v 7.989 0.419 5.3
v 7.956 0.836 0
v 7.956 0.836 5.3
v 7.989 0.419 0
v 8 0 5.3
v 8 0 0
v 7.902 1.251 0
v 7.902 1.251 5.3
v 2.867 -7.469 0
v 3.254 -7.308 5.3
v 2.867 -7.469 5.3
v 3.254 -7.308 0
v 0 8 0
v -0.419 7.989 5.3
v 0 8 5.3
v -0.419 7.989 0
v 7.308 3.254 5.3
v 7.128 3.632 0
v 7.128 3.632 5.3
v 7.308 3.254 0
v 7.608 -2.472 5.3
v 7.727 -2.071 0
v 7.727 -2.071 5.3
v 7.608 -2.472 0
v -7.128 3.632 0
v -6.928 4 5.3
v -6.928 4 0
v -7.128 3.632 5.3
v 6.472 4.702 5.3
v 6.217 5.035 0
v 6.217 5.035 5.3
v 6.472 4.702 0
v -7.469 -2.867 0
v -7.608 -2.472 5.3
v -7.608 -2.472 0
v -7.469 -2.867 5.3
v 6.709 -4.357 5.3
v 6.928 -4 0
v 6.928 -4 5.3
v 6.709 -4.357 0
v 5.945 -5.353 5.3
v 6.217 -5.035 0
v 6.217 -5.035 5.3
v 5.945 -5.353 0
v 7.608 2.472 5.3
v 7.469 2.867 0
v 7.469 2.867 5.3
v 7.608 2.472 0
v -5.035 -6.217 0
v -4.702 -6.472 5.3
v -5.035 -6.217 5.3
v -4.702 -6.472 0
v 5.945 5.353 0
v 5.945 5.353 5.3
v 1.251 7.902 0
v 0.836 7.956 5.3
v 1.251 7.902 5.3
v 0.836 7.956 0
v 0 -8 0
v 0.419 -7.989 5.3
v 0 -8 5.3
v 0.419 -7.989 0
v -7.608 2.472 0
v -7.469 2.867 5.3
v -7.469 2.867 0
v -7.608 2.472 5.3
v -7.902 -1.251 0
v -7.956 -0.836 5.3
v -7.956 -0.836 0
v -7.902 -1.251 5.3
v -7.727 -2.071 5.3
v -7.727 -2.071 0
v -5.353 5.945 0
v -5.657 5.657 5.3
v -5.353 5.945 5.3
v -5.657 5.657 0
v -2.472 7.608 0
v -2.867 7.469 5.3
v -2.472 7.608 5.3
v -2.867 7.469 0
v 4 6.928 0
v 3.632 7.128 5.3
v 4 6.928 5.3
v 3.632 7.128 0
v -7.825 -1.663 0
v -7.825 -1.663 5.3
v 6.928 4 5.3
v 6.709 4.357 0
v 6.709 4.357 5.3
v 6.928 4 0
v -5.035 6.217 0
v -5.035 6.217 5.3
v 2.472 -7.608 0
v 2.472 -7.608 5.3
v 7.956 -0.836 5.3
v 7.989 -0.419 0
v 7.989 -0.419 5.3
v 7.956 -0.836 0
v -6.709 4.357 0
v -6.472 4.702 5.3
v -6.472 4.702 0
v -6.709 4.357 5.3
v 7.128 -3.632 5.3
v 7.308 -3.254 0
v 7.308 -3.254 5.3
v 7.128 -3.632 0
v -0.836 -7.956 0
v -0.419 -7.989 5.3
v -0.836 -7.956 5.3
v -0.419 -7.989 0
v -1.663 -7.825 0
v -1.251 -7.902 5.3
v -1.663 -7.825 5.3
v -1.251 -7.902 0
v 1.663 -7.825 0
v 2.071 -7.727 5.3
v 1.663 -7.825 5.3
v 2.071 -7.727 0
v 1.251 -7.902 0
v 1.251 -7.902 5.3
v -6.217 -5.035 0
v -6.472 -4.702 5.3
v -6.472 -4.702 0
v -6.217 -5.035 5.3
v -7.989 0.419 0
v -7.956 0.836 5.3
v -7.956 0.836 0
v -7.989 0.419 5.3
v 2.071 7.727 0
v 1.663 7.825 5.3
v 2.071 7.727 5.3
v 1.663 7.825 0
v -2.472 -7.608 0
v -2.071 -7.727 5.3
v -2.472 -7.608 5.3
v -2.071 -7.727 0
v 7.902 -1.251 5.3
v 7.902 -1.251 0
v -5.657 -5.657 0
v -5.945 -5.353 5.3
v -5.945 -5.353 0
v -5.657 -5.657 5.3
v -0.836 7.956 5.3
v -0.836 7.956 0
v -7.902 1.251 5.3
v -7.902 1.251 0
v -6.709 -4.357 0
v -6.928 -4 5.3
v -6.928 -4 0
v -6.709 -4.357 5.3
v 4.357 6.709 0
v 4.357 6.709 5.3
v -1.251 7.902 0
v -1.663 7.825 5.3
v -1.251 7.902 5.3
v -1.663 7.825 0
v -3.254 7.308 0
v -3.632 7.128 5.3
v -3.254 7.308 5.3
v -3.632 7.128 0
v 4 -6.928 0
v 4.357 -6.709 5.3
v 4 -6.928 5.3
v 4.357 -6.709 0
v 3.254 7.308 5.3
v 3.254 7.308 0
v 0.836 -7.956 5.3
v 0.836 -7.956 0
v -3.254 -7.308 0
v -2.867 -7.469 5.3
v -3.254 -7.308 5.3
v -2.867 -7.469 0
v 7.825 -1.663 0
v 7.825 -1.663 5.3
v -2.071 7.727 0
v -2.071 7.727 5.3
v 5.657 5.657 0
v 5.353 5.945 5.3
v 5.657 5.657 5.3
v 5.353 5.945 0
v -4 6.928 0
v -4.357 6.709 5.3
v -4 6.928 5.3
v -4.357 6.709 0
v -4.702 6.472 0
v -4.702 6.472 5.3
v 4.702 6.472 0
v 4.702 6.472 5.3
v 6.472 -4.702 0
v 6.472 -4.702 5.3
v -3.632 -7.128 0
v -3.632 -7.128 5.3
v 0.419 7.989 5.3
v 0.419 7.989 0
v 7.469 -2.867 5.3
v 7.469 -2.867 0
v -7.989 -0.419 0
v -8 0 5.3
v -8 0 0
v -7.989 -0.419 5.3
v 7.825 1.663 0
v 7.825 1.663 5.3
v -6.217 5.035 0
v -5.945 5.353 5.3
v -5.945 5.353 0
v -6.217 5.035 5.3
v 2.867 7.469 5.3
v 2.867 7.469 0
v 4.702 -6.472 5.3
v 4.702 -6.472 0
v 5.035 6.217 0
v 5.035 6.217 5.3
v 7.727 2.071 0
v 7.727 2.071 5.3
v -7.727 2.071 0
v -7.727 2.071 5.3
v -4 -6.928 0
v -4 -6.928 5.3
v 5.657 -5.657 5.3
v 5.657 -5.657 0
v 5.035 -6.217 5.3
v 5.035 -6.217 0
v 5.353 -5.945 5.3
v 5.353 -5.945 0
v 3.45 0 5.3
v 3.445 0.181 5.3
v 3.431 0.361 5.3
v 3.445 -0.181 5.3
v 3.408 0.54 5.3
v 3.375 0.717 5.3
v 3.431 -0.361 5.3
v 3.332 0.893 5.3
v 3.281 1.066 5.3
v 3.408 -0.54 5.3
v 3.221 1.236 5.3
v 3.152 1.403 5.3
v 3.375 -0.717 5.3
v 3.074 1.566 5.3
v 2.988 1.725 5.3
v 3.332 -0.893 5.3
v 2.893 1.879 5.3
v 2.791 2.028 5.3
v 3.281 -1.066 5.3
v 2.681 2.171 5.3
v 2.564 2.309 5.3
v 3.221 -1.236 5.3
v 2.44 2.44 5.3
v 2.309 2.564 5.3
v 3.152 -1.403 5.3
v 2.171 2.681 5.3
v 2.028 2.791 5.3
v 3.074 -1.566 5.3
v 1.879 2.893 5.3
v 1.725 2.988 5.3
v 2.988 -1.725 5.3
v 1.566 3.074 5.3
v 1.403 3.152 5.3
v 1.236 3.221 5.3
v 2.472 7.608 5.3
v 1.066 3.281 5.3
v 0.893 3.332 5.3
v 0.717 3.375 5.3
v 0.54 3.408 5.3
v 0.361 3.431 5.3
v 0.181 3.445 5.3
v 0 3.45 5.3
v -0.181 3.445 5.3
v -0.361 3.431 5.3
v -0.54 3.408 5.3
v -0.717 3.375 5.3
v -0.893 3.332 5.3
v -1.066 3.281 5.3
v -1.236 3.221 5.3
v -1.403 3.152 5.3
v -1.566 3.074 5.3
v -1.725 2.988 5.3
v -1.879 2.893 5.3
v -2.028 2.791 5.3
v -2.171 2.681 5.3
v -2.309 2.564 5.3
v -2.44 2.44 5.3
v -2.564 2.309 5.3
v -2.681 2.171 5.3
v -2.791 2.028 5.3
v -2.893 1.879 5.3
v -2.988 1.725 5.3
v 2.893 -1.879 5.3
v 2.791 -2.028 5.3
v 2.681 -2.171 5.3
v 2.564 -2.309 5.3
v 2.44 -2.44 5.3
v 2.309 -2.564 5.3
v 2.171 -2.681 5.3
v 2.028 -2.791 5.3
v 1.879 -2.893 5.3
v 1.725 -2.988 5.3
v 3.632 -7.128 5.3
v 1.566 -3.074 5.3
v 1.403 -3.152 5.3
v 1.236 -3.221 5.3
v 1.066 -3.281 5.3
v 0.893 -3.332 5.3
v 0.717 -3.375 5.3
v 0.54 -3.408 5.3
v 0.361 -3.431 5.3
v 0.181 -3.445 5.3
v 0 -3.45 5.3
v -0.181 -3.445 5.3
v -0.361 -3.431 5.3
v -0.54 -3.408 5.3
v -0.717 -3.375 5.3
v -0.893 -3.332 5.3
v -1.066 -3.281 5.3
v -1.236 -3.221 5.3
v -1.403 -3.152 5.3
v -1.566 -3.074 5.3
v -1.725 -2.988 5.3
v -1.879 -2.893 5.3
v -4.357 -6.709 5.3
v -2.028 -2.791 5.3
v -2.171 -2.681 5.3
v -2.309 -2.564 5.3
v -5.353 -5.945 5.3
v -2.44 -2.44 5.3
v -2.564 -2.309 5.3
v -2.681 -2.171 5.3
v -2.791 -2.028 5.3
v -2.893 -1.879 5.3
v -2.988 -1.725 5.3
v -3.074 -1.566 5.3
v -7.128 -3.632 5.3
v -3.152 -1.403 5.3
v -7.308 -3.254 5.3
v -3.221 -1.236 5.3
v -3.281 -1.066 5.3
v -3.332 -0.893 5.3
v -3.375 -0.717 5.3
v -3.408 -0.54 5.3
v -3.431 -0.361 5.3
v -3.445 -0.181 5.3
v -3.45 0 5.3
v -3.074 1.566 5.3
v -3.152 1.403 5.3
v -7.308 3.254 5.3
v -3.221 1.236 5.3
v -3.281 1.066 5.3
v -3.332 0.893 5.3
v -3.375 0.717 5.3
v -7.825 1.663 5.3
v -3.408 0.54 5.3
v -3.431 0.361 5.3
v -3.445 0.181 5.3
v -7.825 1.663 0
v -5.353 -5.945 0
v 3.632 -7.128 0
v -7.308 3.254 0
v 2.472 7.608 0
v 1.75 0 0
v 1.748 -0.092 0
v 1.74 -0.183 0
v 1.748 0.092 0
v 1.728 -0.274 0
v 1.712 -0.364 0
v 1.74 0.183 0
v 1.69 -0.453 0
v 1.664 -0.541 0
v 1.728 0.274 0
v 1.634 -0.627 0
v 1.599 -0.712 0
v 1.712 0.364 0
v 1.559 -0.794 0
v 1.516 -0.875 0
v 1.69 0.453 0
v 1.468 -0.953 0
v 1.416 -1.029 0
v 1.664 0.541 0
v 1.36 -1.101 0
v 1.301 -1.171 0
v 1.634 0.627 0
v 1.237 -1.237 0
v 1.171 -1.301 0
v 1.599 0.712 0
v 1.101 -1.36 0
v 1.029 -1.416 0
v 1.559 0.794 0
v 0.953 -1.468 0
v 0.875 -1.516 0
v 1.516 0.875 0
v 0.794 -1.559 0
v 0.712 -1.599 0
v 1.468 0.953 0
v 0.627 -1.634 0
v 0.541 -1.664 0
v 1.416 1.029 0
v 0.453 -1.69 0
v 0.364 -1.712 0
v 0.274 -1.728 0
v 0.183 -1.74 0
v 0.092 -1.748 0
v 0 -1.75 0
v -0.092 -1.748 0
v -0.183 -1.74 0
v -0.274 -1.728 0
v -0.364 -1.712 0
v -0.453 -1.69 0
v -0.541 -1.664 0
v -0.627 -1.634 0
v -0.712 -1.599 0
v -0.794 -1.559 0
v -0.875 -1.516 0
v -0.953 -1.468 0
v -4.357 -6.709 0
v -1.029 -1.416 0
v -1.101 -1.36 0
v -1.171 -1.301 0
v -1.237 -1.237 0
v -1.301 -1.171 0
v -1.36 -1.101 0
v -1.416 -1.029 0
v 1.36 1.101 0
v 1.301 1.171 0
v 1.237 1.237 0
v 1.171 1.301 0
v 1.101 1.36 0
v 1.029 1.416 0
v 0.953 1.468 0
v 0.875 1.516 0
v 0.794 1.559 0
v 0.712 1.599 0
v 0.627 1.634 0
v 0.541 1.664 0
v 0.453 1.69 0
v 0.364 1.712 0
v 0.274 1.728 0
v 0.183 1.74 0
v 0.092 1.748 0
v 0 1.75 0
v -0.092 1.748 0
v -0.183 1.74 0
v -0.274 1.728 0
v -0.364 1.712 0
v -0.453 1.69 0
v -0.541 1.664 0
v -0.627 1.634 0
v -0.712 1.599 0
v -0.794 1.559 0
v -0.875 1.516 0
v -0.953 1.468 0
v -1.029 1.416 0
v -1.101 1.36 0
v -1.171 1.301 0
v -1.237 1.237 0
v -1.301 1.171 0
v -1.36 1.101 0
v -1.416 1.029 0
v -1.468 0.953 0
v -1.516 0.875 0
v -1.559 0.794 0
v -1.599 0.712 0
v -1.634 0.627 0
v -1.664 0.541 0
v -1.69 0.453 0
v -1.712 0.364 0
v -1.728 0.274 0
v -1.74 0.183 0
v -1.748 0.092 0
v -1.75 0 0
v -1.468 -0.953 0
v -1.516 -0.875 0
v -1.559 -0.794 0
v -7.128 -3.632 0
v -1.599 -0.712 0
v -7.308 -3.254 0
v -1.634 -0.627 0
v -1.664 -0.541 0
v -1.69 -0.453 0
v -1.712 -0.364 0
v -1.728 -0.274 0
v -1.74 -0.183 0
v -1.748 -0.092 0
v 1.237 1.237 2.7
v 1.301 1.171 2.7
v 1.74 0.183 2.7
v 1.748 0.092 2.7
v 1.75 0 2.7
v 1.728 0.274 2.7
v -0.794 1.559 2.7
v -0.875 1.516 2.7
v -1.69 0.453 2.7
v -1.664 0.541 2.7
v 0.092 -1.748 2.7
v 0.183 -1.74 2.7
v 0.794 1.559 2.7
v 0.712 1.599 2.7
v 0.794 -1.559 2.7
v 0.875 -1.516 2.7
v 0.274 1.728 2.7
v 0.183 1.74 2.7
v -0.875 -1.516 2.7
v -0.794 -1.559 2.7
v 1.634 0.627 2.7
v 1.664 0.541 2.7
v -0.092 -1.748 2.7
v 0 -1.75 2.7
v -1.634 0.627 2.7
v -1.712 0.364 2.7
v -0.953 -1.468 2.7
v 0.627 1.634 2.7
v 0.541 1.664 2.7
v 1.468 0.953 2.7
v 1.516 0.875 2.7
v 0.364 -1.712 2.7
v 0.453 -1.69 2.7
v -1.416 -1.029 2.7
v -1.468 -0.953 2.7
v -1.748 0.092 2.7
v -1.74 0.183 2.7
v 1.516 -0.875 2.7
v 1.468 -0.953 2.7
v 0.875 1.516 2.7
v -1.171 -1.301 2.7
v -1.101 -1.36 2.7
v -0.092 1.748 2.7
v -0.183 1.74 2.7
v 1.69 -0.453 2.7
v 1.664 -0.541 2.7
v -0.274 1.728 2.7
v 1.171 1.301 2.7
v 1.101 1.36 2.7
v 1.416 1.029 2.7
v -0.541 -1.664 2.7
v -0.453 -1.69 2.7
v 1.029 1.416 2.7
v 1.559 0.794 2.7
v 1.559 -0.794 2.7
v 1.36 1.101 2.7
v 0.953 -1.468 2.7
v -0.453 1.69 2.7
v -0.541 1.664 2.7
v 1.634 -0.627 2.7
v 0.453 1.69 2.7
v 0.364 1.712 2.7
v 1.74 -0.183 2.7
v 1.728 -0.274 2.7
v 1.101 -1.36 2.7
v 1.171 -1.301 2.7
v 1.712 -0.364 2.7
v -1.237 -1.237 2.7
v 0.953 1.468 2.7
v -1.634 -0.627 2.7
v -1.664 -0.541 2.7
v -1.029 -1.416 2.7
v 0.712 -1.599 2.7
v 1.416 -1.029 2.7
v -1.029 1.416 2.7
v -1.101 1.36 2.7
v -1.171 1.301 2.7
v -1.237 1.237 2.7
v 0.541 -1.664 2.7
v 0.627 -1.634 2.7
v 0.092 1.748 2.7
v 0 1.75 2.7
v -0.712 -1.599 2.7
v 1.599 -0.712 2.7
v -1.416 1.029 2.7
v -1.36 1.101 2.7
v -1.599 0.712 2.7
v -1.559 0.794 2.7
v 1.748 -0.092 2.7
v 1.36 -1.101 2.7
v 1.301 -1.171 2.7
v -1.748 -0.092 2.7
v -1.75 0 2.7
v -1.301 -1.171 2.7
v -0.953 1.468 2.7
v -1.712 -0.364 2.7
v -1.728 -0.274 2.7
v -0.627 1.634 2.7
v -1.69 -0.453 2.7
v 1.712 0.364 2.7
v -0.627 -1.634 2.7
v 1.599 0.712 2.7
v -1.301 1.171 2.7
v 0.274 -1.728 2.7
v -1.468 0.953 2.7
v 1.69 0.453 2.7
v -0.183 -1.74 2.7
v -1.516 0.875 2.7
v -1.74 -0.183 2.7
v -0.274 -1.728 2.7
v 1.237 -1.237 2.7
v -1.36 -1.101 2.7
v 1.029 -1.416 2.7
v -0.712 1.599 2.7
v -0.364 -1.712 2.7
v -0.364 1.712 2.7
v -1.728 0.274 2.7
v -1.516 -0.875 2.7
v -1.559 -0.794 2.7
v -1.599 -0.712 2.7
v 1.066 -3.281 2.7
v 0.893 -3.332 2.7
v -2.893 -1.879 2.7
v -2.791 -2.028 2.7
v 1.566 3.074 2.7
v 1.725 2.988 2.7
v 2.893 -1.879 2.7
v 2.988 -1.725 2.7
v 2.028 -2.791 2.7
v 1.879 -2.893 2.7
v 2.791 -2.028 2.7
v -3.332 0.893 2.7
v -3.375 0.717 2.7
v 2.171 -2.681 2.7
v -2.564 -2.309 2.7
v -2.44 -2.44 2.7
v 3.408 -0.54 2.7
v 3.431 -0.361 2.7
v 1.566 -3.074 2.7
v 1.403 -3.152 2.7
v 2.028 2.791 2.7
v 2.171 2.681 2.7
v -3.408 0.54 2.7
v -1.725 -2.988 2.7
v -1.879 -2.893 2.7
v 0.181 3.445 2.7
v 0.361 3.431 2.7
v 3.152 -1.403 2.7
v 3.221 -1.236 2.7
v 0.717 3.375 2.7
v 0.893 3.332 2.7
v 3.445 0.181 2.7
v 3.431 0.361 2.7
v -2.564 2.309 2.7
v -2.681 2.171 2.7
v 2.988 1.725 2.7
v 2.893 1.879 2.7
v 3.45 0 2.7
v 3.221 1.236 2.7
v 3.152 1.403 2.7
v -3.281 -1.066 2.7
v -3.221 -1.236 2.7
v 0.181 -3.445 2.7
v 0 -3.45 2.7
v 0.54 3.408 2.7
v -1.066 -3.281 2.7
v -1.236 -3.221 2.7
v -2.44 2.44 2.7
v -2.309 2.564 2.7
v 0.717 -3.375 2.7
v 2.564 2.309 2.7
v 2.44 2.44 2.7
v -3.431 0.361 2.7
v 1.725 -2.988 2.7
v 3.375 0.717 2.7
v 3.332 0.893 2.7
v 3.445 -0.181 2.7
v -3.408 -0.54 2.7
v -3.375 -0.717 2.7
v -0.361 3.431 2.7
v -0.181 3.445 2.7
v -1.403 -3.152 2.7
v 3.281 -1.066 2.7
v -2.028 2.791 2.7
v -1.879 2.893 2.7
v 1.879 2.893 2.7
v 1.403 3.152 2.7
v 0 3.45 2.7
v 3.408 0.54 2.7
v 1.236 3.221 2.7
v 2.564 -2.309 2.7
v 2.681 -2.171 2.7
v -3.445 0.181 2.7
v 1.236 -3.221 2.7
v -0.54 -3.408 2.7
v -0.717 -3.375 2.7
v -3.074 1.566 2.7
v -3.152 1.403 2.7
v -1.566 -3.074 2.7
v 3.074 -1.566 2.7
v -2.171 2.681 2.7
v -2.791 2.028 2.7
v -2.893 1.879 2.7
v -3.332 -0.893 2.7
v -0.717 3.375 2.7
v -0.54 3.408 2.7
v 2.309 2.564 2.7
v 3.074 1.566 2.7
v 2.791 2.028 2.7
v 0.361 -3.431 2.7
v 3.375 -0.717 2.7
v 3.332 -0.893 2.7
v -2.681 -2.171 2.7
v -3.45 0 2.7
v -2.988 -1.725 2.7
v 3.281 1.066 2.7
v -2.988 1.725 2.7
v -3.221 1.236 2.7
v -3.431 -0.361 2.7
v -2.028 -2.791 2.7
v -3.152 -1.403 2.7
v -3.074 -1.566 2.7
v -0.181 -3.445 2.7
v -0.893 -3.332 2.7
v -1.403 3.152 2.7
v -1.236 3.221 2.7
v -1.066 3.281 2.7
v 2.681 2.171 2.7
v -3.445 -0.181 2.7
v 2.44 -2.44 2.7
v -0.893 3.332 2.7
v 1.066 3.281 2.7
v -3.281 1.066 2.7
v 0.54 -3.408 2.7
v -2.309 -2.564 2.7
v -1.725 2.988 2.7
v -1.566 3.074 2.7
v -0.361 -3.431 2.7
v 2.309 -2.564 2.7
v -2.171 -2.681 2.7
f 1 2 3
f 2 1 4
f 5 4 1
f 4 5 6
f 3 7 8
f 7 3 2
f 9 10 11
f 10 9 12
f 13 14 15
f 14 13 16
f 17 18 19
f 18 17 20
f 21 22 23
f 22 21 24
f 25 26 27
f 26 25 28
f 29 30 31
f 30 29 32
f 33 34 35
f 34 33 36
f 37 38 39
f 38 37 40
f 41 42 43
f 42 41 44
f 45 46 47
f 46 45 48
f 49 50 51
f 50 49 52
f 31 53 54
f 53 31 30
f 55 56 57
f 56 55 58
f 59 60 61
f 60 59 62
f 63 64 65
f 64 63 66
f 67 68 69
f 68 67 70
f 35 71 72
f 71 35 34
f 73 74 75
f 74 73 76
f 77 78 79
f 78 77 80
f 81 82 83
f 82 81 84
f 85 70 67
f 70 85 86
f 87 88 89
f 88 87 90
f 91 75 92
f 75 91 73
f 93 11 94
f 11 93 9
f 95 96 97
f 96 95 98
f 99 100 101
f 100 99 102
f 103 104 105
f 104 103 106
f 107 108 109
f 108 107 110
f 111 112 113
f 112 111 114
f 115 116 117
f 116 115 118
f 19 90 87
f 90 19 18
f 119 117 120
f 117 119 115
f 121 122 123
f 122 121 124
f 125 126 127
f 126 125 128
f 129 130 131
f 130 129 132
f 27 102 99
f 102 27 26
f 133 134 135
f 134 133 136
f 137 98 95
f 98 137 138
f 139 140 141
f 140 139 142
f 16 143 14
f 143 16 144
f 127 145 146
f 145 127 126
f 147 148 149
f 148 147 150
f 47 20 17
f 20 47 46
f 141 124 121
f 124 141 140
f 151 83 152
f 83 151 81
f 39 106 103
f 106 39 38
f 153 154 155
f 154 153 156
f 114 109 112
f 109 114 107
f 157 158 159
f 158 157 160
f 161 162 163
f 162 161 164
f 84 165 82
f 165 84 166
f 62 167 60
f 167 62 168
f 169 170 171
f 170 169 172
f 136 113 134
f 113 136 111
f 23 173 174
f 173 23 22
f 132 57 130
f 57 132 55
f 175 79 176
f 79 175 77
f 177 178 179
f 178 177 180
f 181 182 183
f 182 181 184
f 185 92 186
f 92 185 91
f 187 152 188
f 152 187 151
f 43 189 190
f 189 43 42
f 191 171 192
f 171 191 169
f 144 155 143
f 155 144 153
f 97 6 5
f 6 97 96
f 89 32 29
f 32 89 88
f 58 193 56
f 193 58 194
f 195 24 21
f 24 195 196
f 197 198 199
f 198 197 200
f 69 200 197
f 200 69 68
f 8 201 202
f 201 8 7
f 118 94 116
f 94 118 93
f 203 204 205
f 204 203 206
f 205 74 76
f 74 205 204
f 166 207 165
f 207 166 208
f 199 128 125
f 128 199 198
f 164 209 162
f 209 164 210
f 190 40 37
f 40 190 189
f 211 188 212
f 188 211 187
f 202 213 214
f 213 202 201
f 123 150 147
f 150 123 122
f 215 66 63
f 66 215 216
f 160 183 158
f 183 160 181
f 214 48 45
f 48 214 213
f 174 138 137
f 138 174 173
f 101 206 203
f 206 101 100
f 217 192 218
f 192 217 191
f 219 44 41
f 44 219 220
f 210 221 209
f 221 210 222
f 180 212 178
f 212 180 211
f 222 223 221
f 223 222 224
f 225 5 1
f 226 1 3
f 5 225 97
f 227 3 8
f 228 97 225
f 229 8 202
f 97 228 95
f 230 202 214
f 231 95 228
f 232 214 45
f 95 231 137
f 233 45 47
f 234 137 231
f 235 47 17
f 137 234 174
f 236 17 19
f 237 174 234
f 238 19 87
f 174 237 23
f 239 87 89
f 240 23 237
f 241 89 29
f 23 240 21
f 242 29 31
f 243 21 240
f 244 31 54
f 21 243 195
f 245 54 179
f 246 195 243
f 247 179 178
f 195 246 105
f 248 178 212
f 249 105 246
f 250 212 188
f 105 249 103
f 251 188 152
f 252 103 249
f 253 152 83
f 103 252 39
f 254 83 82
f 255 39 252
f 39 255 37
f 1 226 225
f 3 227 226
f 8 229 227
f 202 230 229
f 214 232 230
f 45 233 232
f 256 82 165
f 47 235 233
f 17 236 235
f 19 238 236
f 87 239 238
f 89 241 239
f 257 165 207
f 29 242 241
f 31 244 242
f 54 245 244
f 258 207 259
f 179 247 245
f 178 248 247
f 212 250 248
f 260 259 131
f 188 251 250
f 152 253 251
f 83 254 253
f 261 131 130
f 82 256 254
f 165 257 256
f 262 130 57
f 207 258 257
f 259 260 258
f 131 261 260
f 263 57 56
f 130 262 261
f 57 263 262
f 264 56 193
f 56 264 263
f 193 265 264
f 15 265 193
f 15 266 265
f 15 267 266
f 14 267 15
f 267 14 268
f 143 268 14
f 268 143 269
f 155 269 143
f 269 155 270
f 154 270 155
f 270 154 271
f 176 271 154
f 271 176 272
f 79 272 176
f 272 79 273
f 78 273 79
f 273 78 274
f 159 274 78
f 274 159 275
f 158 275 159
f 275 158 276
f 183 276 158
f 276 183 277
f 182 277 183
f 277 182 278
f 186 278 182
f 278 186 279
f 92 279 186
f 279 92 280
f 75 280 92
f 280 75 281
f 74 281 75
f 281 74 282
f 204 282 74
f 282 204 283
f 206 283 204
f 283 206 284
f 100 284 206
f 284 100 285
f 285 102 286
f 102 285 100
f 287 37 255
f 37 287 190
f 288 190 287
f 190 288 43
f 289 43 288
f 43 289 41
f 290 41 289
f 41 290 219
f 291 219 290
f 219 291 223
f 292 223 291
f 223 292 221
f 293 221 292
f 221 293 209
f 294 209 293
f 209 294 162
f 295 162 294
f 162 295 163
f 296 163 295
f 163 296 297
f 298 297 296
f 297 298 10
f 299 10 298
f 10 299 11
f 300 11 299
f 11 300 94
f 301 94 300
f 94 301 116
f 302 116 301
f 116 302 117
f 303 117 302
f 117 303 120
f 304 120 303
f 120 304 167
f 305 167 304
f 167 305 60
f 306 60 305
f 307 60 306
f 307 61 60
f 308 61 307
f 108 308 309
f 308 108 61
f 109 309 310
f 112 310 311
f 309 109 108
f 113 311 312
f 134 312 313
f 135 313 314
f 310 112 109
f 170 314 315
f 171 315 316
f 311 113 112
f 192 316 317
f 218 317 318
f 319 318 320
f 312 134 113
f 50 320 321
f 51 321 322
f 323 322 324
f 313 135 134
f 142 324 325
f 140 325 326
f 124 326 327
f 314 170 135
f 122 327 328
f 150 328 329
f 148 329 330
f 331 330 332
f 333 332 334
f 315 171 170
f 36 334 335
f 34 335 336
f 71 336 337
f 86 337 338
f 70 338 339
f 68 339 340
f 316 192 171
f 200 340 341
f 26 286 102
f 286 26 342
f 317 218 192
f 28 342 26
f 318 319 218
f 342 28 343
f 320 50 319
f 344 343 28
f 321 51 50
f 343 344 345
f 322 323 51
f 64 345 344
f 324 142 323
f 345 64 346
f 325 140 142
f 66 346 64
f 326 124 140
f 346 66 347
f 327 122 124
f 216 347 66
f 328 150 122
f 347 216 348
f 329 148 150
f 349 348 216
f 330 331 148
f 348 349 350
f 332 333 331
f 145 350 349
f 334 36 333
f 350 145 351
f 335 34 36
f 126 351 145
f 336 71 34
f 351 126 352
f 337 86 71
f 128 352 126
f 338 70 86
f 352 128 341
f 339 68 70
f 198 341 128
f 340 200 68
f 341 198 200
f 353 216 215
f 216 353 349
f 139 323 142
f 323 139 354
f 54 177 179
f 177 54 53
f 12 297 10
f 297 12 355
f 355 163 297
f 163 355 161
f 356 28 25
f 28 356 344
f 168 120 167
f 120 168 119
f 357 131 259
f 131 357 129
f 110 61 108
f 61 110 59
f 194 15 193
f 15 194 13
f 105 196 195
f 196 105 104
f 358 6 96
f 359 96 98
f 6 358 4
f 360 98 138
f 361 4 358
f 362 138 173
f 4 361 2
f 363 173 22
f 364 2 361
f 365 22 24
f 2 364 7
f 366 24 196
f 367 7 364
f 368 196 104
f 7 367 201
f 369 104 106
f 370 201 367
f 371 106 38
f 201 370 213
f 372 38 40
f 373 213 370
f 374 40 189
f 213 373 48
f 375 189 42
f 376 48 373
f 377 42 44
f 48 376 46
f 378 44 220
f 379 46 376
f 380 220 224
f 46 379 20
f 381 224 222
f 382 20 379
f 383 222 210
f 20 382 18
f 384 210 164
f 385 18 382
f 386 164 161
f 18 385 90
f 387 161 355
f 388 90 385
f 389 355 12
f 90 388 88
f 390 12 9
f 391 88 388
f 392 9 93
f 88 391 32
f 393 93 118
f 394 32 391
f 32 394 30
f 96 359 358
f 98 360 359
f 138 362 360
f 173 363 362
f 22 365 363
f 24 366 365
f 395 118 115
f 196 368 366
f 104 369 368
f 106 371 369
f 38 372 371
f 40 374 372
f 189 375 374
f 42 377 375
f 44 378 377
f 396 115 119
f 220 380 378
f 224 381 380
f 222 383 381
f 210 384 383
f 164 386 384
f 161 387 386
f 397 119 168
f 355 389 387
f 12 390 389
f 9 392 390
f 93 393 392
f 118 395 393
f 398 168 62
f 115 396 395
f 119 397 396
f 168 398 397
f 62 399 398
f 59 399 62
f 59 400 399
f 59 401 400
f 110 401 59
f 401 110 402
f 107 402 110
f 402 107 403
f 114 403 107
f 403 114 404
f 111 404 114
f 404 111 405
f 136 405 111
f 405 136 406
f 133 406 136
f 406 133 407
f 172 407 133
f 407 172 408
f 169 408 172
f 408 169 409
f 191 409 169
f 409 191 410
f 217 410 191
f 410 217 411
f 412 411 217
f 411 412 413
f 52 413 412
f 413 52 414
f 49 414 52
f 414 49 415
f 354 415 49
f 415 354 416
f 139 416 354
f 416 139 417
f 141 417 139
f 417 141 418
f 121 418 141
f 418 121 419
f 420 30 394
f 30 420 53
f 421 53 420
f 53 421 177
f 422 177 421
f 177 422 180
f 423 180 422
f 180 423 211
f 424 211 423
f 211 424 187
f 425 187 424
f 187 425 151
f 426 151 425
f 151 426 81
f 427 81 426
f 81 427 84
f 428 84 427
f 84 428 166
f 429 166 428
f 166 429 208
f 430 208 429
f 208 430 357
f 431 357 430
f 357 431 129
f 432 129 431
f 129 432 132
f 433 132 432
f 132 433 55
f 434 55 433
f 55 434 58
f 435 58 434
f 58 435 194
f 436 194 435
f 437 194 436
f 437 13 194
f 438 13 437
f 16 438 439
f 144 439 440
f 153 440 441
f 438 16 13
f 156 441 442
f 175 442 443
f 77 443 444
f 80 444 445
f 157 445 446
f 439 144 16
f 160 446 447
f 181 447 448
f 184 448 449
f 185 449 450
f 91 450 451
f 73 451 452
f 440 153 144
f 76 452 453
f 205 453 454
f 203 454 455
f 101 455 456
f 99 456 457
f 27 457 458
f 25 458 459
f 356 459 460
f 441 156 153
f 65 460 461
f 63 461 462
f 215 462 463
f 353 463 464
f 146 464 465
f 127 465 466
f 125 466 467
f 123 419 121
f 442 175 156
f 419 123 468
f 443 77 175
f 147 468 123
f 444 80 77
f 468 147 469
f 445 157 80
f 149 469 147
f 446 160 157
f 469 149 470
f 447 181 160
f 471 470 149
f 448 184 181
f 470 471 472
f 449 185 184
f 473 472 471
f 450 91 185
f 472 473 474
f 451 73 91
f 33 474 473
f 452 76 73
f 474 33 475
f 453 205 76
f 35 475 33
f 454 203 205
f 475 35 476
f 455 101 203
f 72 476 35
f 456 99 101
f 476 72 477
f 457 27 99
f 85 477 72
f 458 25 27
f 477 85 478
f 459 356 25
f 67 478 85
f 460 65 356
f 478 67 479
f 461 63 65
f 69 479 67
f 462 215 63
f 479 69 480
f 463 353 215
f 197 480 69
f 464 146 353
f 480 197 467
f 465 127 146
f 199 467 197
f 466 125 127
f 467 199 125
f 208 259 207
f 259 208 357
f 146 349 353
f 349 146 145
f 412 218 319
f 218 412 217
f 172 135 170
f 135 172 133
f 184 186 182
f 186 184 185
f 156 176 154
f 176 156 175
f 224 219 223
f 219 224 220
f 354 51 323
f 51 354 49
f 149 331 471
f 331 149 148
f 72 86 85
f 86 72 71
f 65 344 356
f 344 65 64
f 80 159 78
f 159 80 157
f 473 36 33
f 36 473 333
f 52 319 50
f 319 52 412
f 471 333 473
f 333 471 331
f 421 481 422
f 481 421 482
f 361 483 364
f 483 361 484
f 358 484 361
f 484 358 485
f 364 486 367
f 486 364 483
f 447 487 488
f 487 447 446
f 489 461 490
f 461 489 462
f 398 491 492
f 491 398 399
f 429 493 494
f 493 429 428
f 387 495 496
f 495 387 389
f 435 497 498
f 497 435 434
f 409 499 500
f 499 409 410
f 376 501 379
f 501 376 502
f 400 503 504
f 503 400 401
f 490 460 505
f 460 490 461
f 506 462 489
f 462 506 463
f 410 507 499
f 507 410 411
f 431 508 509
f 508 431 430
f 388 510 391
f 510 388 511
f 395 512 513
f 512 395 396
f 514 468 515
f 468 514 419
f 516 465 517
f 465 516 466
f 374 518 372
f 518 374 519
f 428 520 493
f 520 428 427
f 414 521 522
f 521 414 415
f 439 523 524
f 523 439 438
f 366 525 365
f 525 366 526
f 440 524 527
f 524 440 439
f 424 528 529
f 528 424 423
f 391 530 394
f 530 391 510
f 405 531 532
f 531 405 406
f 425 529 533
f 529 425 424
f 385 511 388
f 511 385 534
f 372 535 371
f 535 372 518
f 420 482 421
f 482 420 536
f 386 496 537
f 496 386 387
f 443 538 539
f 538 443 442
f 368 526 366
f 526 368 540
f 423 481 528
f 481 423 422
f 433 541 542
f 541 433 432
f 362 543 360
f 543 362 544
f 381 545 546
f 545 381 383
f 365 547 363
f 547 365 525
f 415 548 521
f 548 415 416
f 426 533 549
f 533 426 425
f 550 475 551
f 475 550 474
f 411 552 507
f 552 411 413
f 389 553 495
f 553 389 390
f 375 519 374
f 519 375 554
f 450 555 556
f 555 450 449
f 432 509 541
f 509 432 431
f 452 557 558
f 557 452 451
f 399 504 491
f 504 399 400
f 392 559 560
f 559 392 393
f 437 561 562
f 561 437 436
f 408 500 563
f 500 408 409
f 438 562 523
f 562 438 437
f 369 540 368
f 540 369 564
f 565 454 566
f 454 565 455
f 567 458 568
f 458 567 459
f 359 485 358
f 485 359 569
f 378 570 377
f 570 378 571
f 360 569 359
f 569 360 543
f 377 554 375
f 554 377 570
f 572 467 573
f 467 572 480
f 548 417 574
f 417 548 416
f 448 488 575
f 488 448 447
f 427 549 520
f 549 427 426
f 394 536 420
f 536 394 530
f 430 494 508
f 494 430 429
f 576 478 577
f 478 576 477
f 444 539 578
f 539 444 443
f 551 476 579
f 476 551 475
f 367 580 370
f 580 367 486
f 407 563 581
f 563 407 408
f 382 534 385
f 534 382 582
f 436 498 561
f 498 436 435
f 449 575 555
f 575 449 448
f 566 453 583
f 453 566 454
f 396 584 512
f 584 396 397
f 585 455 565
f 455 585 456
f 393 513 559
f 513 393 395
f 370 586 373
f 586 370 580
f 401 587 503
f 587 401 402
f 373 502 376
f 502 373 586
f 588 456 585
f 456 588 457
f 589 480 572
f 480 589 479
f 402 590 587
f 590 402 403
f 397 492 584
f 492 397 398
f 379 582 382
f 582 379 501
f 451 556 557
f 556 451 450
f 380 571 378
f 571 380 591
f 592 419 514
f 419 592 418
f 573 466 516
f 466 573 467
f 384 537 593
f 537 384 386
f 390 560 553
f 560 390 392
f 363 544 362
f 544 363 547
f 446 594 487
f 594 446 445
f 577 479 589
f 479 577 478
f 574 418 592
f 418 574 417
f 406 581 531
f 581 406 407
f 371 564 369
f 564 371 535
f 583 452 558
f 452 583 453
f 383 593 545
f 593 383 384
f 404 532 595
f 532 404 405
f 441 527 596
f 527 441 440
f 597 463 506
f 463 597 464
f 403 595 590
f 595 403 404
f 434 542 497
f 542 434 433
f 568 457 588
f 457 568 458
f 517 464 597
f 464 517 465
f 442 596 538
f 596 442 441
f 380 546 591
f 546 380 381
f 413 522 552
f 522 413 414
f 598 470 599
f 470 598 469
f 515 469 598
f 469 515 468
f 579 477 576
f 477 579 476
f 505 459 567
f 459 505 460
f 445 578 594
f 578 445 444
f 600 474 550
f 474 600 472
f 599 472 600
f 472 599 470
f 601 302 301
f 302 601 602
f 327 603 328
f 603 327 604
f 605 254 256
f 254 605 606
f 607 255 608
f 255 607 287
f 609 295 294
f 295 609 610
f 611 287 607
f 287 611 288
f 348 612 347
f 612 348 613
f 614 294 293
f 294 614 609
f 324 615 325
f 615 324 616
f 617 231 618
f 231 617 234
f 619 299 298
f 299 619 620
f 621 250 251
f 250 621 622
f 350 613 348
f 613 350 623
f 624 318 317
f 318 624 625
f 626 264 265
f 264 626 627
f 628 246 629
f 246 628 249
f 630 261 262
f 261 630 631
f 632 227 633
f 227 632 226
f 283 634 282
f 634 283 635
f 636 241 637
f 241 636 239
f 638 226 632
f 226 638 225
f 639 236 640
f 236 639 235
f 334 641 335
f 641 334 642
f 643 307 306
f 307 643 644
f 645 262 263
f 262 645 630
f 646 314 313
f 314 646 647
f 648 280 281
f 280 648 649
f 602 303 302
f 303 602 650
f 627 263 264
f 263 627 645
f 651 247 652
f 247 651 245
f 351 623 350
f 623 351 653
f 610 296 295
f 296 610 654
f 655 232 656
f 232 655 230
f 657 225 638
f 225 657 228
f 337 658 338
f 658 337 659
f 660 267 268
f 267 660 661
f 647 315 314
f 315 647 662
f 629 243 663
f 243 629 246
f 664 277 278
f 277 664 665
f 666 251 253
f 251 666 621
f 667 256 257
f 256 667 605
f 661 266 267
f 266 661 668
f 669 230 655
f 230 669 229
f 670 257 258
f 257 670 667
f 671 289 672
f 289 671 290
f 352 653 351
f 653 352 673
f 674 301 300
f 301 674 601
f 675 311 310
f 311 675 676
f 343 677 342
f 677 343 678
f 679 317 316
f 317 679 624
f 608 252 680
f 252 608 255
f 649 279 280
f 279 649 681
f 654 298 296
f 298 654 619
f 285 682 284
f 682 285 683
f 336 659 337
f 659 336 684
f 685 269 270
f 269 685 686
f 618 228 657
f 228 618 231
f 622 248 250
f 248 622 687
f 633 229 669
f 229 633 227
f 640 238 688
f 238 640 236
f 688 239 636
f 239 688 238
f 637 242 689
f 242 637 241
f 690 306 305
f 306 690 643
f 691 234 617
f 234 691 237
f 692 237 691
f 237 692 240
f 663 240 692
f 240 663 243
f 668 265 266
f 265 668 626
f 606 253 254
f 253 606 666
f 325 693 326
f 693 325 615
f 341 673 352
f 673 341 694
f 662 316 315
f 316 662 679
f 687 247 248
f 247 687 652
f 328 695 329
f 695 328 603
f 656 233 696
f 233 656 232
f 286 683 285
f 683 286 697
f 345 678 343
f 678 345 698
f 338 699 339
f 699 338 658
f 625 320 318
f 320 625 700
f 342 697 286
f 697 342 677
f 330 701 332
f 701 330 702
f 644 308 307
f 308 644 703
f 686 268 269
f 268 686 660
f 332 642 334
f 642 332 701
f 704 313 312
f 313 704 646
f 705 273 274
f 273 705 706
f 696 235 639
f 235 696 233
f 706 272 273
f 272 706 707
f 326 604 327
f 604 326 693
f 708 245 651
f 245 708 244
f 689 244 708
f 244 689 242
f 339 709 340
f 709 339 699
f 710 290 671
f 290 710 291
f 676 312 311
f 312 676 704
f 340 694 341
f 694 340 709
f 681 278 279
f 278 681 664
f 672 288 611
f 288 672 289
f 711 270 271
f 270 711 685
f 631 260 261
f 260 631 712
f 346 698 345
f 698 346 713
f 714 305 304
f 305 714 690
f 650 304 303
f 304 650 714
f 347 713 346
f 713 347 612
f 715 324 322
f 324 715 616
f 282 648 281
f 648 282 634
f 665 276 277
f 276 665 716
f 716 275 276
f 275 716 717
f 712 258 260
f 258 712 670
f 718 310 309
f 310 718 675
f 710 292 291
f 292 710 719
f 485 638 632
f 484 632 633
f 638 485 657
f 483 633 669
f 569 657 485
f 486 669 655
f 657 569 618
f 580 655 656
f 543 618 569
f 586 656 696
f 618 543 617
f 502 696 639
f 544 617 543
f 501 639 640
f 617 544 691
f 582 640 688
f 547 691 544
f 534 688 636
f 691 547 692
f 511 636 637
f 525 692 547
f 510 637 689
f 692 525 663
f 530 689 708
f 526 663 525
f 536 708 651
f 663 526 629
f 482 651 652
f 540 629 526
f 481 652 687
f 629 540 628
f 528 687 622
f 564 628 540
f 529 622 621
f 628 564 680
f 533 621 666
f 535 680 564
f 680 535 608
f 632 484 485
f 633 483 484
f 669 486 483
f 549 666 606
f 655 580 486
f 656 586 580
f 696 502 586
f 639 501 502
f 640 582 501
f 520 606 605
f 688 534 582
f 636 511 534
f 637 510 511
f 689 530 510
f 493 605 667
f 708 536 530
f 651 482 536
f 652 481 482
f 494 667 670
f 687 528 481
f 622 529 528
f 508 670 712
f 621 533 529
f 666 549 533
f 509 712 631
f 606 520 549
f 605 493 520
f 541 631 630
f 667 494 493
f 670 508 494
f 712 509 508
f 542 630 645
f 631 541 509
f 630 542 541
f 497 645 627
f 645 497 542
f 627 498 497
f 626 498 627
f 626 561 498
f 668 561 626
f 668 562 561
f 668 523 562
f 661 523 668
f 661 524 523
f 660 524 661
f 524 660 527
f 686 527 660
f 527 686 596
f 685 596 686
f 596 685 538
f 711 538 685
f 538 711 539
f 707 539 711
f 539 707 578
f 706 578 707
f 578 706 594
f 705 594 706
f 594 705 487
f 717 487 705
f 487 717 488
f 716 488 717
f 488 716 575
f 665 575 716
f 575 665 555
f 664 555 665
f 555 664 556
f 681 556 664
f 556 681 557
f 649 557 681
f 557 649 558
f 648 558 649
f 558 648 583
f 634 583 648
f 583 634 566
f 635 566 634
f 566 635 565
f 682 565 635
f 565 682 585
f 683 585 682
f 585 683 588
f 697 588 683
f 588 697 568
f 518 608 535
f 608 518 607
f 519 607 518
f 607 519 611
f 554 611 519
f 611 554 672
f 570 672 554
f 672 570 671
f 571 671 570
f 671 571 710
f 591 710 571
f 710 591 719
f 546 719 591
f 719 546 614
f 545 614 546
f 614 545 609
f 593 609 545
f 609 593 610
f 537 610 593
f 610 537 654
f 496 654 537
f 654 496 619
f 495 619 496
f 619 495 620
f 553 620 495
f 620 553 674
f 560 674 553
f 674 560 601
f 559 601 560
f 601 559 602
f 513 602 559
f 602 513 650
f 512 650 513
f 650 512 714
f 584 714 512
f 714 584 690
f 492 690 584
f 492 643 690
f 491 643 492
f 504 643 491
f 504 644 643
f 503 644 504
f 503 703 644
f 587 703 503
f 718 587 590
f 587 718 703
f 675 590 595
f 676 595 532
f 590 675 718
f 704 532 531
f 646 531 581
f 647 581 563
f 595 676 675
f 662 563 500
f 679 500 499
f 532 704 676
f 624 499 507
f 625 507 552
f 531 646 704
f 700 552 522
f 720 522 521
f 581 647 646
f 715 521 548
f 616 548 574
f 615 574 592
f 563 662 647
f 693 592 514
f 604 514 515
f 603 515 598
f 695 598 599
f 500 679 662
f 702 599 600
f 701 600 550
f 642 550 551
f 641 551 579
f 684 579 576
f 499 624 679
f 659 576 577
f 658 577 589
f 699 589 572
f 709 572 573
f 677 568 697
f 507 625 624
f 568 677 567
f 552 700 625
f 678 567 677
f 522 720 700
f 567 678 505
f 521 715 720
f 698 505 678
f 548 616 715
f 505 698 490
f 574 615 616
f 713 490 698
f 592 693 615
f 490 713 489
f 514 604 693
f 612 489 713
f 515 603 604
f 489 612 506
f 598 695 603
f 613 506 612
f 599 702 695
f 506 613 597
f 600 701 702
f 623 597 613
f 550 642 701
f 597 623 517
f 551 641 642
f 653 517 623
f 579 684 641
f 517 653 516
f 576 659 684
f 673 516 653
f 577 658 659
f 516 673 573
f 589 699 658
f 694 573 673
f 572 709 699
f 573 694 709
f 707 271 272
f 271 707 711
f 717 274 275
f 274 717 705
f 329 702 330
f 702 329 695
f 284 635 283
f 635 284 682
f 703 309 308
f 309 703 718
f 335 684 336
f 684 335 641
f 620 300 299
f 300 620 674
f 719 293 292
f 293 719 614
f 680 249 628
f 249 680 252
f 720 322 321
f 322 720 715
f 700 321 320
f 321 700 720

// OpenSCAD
hole_depth = 5.3;
hole_r = (16 / 2);

screw_head_depth = 2.6;
screw_head_r = (6.9 / 2);
screw_shaft_r = (3.5 / 2);

roundness = 120; 


difference() {
    cylinder(h = hole_depth, r = hole_r, $fn = roundness);
    
    cylinder(h = hole_depth, r = screw_shaft_r, $fn = roundness);

    translate([0, 0, (hole_depth - screw_head_depth)]) {
        cylinder(h = screw_head_depth, r = screw_head_r, $fn = roundness);
    }
}
